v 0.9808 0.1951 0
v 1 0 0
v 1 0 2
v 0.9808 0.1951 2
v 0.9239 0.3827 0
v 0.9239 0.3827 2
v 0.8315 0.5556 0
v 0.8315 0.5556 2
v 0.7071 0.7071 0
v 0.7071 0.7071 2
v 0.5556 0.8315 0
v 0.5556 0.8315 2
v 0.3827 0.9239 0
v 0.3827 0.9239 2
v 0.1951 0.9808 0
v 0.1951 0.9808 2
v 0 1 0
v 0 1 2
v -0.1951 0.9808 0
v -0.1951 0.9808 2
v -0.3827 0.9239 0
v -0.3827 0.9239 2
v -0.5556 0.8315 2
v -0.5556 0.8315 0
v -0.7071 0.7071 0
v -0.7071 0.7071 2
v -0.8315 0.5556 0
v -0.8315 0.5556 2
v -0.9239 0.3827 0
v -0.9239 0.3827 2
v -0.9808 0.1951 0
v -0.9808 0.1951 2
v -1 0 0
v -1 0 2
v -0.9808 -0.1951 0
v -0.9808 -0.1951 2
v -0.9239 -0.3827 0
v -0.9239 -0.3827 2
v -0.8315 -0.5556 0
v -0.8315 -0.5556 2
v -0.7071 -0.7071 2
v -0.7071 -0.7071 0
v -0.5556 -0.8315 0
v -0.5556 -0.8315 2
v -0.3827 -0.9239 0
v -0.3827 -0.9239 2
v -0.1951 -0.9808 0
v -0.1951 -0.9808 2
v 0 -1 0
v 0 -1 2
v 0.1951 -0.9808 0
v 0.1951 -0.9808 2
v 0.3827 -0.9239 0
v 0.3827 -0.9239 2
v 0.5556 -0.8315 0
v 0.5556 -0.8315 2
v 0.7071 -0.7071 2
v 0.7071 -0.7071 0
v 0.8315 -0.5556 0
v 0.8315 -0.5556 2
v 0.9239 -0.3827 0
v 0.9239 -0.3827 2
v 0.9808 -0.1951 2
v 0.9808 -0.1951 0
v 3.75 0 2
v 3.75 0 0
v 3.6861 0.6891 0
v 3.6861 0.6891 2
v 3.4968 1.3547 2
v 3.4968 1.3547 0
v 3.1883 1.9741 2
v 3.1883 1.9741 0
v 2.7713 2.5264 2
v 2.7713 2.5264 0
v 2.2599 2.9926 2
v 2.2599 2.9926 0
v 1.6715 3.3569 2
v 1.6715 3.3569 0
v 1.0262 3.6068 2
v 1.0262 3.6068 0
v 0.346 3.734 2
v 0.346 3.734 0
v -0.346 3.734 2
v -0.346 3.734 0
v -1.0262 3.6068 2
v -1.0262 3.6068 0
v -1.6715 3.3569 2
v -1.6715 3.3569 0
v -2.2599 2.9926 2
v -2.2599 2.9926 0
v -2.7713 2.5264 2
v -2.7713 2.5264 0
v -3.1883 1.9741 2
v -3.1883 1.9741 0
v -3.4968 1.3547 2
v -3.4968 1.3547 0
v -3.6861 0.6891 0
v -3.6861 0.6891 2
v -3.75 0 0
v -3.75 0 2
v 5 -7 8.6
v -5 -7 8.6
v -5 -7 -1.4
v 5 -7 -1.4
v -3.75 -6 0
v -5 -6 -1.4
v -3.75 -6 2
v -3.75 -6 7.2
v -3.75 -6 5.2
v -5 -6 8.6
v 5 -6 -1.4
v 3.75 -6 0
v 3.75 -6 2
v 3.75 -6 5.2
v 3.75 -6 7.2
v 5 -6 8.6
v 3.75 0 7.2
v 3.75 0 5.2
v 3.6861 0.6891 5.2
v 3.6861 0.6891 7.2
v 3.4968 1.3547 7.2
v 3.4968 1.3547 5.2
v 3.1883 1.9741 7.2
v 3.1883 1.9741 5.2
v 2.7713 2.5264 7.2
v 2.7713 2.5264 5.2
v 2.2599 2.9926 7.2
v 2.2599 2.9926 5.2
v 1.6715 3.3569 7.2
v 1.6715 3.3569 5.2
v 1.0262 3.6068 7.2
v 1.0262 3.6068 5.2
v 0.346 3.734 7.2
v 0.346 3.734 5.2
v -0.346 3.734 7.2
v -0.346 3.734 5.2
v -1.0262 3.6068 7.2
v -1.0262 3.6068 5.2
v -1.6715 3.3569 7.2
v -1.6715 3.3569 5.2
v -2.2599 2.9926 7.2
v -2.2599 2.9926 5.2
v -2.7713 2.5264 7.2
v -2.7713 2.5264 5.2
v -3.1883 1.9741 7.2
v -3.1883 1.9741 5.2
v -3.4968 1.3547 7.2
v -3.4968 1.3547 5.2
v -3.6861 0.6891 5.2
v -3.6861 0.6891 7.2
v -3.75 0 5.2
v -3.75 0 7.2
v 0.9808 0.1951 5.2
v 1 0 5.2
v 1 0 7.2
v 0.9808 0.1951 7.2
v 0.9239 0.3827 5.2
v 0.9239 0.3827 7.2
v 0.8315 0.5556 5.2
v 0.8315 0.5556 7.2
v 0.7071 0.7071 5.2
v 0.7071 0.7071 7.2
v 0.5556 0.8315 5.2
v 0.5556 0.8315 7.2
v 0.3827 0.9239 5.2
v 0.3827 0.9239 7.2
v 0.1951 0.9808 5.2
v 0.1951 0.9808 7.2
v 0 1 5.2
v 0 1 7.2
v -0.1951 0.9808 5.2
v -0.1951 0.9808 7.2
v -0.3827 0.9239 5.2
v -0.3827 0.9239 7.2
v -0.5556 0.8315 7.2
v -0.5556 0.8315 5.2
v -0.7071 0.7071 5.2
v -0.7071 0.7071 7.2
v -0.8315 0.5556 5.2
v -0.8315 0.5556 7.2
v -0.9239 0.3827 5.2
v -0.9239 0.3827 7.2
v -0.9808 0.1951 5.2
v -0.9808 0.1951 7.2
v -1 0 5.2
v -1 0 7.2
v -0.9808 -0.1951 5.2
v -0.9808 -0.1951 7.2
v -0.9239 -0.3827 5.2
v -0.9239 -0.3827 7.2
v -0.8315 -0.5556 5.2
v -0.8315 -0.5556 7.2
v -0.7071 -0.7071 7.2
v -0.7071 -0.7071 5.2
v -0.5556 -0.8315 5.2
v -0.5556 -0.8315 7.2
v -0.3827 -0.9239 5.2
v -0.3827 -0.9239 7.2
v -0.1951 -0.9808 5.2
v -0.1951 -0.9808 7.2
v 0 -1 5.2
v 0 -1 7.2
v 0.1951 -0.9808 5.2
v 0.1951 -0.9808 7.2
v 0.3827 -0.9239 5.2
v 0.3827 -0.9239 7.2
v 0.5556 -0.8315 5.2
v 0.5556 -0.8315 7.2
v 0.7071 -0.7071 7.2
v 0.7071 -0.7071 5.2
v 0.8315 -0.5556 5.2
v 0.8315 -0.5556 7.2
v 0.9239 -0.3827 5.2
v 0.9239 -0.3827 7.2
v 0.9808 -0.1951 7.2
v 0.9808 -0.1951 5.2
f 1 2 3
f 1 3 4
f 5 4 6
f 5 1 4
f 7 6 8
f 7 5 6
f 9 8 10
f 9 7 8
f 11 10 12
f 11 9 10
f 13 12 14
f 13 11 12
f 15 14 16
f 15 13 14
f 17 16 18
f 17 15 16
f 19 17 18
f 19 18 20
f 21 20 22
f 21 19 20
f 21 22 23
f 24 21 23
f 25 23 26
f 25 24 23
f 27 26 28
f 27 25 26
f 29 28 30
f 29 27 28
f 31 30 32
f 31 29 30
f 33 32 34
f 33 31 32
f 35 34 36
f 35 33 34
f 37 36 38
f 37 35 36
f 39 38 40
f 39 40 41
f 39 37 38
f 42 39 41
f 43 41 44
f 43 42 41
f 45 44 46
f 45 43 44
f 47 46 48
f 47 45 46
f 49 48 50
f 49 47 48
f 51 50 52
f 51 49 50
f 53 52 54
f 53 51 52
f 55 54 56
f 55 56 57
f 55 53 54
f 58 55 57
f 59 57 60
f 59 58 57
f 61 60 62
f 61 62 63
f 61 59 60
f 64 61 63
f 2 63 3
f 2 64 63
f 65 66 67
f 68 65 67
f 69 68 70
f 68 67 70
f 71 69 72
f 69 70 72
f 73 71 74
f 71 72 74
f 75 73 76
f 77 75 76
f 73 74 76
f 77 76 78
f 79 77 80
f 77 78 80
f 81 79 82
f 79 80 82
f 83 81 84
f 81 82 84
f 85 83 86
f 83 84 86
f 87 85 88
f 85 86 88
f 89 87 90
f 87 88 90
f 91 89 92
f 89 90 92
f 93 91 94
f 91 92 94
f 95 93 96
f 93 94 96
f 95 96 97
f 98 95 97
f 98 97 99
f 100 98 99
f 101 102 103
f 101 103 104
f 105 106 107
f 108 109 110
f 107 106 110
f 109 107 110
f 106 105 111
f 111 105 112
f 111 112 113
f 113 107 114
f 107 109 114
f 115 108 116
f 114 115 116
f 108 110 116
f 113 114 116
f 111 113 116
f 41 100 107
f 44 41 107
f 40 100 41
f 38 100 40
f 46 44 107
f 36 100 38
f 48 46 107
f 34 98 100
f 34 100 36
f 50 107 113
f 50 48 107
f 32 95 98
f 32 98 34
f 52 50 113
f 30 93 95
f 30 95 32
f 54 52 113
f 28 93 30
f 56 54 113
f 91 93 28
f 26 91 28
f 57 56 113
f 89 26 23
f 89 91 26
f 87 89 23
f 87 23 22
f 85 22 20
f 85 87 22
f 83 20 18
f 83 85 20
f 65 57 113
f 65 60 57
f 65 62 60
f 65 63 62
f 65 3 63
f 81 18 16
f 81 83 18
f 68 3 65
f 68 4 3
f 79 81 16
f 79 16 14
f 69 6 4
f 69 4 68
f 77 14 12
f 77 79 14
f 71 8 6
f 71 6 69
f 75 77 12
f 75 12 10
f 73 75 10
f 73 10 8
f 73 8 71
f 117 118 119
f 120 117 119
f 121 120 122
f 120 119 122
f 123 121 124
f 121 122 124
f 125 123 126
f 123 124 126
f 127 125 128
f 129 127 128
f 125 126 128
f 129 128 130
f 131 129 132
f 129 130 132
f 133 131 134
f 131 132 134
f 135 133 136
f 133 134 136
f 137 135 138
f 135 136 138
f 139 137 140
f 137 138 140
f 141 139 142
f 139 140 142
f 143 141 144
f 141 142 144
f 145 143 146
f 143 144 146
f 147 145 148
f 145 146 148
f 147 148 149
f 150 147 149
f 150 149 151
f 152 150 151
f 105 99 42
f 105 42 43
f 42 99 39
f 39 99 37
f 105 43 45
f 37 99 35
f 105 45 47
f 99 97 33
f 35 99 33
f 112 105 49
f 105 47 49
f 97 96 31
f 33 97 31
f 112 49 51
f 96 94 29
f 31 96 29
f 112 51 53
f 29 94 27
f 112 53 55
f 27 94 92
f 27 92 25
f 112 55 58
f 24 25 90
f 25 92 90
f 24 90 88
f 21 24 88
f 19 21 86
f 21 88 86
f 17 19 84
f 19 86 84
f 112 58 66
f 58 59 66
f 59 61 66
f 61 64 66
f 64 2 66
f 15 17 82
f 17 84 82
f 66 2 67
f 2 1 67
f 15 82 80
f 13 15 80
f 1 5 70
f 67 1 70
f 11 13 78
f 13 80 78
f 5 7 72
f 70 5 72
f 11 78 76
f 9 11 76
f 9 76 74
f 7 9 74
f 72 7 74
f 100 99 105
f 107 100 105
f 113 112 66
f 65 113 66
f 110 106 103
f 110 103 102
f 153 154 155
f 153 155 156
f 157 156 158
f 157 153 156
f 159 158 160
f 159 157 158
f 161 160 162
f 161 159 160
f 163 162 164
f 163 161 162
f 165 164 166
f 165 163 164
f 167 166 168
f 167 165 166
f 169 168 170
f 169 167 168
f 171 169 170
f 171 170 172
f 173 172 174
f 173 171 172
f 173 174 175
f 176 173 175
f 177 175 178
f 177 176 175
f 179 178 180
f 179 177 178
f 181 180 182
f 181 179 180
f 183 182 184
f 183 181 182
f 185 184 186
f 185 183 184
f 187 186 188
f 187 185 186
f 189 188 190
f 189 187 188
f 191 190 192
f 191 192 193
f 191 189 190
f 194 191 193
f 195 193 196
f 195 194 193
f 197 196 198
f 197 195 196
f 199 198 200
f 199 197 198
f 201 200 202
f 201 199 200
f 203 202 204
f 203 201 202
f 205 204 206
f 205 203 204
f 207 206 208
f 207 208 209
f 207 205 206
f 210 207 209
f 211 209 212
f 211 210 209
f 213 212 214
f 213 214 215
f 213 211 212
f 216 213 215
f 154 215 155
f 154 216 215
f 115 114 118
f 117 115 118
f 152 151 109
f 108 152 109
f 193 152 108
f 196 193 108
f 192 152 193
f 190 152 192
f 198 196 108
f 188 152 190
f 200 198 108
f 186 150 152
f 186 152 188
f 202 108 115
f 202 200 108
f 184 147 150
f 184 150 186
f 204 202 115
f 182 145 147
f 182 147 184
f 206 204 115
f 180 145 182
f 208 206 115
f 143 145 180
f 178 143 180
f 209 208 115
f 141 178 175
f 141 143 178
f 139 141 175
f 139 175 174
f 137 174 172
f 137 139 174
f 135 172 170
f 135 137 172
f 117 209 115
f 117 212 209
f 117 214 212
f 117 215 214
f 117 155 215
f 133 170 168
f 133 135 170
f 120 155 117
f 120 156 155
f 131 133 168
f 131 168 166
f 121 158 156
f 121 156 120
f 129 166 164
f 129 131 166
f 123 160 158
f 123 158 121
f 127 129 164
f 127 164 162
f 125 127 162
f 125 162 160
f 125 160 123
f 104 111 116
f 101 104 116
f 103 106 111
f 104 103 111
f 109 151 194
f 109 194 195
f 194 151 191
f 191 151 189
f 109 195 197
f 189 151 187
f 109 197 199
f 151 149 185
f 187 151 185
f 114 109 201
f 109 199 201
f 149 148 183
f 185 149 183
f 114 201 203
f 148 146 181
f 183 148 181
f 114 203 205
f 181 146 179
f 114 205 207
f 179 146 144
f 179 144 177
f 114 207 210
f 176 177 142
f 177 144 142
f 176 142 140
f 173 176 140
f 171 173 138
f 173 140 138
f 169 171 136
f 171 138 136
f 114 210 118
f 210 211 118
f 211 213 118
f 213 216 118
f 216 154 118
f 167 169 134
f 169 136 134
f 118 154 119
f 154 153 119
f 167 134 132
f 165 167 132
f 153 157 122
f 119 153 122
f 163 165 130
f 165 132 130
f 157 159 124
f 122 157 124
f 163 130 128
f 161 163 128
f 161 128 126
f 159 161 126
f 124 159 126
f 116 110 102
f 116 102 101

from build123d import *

# Parameters (mm, degrees)
CROQUIS1_R              = 1
SALIENTE_EXTRUIR1_DEPTH = 2
MATRIZL1_COUNT          = 2
MATRIZL1_PITCH          = 5.2
CROQUIS2_W              = 10
CROQUIS2_H              = 10
SALIENTE_EXTRUIR2_DEPTH = 1


with BuildPart() as part:
    # Croquis1 → Saliente-Extruir1 (new body)
    with BuildSketch(Plane.XY):
        with BuildLine():
            Line((-3.75, 0), (-3.75, -6))
            Line((-3.75, -6), (3.75, -6))
            Line((3.75, -6), (3.75, 0))
            ThreePointArc((3.75, 0), (0, 3.75), (-3.75, 0))
        make_face()
        Circle(CROQUIS1_R, mode=Mode.SUBTRACT)
    extrude(amount=SALIENTE_EXTRUIR1_DEPTH)


with BuildPart() as matrizl1_1:
    # MatrizL1: pattern copy
    add(part.part.moved(Location(Vector(0, 0, 1) * (1 * MATRIZL1_PITCH))))


with BuildPart() as part_1:
    add(part.part)

    add(matrizl1_1.part)  # Saliente-Extruir2 merges MatrizL1_1
    # Croquis2 → Saliente-Extruir2 (add)
    with BuildSketch(Plane.XZ.offset(6)):
        with Locations((0, 3.6)):
            Rectangle(CROQUIS2_W, CROQUIS2_H)
    extrude(amount=SALIENTE_EXTRUIR2_DEPTH)


solid = part_1.part
